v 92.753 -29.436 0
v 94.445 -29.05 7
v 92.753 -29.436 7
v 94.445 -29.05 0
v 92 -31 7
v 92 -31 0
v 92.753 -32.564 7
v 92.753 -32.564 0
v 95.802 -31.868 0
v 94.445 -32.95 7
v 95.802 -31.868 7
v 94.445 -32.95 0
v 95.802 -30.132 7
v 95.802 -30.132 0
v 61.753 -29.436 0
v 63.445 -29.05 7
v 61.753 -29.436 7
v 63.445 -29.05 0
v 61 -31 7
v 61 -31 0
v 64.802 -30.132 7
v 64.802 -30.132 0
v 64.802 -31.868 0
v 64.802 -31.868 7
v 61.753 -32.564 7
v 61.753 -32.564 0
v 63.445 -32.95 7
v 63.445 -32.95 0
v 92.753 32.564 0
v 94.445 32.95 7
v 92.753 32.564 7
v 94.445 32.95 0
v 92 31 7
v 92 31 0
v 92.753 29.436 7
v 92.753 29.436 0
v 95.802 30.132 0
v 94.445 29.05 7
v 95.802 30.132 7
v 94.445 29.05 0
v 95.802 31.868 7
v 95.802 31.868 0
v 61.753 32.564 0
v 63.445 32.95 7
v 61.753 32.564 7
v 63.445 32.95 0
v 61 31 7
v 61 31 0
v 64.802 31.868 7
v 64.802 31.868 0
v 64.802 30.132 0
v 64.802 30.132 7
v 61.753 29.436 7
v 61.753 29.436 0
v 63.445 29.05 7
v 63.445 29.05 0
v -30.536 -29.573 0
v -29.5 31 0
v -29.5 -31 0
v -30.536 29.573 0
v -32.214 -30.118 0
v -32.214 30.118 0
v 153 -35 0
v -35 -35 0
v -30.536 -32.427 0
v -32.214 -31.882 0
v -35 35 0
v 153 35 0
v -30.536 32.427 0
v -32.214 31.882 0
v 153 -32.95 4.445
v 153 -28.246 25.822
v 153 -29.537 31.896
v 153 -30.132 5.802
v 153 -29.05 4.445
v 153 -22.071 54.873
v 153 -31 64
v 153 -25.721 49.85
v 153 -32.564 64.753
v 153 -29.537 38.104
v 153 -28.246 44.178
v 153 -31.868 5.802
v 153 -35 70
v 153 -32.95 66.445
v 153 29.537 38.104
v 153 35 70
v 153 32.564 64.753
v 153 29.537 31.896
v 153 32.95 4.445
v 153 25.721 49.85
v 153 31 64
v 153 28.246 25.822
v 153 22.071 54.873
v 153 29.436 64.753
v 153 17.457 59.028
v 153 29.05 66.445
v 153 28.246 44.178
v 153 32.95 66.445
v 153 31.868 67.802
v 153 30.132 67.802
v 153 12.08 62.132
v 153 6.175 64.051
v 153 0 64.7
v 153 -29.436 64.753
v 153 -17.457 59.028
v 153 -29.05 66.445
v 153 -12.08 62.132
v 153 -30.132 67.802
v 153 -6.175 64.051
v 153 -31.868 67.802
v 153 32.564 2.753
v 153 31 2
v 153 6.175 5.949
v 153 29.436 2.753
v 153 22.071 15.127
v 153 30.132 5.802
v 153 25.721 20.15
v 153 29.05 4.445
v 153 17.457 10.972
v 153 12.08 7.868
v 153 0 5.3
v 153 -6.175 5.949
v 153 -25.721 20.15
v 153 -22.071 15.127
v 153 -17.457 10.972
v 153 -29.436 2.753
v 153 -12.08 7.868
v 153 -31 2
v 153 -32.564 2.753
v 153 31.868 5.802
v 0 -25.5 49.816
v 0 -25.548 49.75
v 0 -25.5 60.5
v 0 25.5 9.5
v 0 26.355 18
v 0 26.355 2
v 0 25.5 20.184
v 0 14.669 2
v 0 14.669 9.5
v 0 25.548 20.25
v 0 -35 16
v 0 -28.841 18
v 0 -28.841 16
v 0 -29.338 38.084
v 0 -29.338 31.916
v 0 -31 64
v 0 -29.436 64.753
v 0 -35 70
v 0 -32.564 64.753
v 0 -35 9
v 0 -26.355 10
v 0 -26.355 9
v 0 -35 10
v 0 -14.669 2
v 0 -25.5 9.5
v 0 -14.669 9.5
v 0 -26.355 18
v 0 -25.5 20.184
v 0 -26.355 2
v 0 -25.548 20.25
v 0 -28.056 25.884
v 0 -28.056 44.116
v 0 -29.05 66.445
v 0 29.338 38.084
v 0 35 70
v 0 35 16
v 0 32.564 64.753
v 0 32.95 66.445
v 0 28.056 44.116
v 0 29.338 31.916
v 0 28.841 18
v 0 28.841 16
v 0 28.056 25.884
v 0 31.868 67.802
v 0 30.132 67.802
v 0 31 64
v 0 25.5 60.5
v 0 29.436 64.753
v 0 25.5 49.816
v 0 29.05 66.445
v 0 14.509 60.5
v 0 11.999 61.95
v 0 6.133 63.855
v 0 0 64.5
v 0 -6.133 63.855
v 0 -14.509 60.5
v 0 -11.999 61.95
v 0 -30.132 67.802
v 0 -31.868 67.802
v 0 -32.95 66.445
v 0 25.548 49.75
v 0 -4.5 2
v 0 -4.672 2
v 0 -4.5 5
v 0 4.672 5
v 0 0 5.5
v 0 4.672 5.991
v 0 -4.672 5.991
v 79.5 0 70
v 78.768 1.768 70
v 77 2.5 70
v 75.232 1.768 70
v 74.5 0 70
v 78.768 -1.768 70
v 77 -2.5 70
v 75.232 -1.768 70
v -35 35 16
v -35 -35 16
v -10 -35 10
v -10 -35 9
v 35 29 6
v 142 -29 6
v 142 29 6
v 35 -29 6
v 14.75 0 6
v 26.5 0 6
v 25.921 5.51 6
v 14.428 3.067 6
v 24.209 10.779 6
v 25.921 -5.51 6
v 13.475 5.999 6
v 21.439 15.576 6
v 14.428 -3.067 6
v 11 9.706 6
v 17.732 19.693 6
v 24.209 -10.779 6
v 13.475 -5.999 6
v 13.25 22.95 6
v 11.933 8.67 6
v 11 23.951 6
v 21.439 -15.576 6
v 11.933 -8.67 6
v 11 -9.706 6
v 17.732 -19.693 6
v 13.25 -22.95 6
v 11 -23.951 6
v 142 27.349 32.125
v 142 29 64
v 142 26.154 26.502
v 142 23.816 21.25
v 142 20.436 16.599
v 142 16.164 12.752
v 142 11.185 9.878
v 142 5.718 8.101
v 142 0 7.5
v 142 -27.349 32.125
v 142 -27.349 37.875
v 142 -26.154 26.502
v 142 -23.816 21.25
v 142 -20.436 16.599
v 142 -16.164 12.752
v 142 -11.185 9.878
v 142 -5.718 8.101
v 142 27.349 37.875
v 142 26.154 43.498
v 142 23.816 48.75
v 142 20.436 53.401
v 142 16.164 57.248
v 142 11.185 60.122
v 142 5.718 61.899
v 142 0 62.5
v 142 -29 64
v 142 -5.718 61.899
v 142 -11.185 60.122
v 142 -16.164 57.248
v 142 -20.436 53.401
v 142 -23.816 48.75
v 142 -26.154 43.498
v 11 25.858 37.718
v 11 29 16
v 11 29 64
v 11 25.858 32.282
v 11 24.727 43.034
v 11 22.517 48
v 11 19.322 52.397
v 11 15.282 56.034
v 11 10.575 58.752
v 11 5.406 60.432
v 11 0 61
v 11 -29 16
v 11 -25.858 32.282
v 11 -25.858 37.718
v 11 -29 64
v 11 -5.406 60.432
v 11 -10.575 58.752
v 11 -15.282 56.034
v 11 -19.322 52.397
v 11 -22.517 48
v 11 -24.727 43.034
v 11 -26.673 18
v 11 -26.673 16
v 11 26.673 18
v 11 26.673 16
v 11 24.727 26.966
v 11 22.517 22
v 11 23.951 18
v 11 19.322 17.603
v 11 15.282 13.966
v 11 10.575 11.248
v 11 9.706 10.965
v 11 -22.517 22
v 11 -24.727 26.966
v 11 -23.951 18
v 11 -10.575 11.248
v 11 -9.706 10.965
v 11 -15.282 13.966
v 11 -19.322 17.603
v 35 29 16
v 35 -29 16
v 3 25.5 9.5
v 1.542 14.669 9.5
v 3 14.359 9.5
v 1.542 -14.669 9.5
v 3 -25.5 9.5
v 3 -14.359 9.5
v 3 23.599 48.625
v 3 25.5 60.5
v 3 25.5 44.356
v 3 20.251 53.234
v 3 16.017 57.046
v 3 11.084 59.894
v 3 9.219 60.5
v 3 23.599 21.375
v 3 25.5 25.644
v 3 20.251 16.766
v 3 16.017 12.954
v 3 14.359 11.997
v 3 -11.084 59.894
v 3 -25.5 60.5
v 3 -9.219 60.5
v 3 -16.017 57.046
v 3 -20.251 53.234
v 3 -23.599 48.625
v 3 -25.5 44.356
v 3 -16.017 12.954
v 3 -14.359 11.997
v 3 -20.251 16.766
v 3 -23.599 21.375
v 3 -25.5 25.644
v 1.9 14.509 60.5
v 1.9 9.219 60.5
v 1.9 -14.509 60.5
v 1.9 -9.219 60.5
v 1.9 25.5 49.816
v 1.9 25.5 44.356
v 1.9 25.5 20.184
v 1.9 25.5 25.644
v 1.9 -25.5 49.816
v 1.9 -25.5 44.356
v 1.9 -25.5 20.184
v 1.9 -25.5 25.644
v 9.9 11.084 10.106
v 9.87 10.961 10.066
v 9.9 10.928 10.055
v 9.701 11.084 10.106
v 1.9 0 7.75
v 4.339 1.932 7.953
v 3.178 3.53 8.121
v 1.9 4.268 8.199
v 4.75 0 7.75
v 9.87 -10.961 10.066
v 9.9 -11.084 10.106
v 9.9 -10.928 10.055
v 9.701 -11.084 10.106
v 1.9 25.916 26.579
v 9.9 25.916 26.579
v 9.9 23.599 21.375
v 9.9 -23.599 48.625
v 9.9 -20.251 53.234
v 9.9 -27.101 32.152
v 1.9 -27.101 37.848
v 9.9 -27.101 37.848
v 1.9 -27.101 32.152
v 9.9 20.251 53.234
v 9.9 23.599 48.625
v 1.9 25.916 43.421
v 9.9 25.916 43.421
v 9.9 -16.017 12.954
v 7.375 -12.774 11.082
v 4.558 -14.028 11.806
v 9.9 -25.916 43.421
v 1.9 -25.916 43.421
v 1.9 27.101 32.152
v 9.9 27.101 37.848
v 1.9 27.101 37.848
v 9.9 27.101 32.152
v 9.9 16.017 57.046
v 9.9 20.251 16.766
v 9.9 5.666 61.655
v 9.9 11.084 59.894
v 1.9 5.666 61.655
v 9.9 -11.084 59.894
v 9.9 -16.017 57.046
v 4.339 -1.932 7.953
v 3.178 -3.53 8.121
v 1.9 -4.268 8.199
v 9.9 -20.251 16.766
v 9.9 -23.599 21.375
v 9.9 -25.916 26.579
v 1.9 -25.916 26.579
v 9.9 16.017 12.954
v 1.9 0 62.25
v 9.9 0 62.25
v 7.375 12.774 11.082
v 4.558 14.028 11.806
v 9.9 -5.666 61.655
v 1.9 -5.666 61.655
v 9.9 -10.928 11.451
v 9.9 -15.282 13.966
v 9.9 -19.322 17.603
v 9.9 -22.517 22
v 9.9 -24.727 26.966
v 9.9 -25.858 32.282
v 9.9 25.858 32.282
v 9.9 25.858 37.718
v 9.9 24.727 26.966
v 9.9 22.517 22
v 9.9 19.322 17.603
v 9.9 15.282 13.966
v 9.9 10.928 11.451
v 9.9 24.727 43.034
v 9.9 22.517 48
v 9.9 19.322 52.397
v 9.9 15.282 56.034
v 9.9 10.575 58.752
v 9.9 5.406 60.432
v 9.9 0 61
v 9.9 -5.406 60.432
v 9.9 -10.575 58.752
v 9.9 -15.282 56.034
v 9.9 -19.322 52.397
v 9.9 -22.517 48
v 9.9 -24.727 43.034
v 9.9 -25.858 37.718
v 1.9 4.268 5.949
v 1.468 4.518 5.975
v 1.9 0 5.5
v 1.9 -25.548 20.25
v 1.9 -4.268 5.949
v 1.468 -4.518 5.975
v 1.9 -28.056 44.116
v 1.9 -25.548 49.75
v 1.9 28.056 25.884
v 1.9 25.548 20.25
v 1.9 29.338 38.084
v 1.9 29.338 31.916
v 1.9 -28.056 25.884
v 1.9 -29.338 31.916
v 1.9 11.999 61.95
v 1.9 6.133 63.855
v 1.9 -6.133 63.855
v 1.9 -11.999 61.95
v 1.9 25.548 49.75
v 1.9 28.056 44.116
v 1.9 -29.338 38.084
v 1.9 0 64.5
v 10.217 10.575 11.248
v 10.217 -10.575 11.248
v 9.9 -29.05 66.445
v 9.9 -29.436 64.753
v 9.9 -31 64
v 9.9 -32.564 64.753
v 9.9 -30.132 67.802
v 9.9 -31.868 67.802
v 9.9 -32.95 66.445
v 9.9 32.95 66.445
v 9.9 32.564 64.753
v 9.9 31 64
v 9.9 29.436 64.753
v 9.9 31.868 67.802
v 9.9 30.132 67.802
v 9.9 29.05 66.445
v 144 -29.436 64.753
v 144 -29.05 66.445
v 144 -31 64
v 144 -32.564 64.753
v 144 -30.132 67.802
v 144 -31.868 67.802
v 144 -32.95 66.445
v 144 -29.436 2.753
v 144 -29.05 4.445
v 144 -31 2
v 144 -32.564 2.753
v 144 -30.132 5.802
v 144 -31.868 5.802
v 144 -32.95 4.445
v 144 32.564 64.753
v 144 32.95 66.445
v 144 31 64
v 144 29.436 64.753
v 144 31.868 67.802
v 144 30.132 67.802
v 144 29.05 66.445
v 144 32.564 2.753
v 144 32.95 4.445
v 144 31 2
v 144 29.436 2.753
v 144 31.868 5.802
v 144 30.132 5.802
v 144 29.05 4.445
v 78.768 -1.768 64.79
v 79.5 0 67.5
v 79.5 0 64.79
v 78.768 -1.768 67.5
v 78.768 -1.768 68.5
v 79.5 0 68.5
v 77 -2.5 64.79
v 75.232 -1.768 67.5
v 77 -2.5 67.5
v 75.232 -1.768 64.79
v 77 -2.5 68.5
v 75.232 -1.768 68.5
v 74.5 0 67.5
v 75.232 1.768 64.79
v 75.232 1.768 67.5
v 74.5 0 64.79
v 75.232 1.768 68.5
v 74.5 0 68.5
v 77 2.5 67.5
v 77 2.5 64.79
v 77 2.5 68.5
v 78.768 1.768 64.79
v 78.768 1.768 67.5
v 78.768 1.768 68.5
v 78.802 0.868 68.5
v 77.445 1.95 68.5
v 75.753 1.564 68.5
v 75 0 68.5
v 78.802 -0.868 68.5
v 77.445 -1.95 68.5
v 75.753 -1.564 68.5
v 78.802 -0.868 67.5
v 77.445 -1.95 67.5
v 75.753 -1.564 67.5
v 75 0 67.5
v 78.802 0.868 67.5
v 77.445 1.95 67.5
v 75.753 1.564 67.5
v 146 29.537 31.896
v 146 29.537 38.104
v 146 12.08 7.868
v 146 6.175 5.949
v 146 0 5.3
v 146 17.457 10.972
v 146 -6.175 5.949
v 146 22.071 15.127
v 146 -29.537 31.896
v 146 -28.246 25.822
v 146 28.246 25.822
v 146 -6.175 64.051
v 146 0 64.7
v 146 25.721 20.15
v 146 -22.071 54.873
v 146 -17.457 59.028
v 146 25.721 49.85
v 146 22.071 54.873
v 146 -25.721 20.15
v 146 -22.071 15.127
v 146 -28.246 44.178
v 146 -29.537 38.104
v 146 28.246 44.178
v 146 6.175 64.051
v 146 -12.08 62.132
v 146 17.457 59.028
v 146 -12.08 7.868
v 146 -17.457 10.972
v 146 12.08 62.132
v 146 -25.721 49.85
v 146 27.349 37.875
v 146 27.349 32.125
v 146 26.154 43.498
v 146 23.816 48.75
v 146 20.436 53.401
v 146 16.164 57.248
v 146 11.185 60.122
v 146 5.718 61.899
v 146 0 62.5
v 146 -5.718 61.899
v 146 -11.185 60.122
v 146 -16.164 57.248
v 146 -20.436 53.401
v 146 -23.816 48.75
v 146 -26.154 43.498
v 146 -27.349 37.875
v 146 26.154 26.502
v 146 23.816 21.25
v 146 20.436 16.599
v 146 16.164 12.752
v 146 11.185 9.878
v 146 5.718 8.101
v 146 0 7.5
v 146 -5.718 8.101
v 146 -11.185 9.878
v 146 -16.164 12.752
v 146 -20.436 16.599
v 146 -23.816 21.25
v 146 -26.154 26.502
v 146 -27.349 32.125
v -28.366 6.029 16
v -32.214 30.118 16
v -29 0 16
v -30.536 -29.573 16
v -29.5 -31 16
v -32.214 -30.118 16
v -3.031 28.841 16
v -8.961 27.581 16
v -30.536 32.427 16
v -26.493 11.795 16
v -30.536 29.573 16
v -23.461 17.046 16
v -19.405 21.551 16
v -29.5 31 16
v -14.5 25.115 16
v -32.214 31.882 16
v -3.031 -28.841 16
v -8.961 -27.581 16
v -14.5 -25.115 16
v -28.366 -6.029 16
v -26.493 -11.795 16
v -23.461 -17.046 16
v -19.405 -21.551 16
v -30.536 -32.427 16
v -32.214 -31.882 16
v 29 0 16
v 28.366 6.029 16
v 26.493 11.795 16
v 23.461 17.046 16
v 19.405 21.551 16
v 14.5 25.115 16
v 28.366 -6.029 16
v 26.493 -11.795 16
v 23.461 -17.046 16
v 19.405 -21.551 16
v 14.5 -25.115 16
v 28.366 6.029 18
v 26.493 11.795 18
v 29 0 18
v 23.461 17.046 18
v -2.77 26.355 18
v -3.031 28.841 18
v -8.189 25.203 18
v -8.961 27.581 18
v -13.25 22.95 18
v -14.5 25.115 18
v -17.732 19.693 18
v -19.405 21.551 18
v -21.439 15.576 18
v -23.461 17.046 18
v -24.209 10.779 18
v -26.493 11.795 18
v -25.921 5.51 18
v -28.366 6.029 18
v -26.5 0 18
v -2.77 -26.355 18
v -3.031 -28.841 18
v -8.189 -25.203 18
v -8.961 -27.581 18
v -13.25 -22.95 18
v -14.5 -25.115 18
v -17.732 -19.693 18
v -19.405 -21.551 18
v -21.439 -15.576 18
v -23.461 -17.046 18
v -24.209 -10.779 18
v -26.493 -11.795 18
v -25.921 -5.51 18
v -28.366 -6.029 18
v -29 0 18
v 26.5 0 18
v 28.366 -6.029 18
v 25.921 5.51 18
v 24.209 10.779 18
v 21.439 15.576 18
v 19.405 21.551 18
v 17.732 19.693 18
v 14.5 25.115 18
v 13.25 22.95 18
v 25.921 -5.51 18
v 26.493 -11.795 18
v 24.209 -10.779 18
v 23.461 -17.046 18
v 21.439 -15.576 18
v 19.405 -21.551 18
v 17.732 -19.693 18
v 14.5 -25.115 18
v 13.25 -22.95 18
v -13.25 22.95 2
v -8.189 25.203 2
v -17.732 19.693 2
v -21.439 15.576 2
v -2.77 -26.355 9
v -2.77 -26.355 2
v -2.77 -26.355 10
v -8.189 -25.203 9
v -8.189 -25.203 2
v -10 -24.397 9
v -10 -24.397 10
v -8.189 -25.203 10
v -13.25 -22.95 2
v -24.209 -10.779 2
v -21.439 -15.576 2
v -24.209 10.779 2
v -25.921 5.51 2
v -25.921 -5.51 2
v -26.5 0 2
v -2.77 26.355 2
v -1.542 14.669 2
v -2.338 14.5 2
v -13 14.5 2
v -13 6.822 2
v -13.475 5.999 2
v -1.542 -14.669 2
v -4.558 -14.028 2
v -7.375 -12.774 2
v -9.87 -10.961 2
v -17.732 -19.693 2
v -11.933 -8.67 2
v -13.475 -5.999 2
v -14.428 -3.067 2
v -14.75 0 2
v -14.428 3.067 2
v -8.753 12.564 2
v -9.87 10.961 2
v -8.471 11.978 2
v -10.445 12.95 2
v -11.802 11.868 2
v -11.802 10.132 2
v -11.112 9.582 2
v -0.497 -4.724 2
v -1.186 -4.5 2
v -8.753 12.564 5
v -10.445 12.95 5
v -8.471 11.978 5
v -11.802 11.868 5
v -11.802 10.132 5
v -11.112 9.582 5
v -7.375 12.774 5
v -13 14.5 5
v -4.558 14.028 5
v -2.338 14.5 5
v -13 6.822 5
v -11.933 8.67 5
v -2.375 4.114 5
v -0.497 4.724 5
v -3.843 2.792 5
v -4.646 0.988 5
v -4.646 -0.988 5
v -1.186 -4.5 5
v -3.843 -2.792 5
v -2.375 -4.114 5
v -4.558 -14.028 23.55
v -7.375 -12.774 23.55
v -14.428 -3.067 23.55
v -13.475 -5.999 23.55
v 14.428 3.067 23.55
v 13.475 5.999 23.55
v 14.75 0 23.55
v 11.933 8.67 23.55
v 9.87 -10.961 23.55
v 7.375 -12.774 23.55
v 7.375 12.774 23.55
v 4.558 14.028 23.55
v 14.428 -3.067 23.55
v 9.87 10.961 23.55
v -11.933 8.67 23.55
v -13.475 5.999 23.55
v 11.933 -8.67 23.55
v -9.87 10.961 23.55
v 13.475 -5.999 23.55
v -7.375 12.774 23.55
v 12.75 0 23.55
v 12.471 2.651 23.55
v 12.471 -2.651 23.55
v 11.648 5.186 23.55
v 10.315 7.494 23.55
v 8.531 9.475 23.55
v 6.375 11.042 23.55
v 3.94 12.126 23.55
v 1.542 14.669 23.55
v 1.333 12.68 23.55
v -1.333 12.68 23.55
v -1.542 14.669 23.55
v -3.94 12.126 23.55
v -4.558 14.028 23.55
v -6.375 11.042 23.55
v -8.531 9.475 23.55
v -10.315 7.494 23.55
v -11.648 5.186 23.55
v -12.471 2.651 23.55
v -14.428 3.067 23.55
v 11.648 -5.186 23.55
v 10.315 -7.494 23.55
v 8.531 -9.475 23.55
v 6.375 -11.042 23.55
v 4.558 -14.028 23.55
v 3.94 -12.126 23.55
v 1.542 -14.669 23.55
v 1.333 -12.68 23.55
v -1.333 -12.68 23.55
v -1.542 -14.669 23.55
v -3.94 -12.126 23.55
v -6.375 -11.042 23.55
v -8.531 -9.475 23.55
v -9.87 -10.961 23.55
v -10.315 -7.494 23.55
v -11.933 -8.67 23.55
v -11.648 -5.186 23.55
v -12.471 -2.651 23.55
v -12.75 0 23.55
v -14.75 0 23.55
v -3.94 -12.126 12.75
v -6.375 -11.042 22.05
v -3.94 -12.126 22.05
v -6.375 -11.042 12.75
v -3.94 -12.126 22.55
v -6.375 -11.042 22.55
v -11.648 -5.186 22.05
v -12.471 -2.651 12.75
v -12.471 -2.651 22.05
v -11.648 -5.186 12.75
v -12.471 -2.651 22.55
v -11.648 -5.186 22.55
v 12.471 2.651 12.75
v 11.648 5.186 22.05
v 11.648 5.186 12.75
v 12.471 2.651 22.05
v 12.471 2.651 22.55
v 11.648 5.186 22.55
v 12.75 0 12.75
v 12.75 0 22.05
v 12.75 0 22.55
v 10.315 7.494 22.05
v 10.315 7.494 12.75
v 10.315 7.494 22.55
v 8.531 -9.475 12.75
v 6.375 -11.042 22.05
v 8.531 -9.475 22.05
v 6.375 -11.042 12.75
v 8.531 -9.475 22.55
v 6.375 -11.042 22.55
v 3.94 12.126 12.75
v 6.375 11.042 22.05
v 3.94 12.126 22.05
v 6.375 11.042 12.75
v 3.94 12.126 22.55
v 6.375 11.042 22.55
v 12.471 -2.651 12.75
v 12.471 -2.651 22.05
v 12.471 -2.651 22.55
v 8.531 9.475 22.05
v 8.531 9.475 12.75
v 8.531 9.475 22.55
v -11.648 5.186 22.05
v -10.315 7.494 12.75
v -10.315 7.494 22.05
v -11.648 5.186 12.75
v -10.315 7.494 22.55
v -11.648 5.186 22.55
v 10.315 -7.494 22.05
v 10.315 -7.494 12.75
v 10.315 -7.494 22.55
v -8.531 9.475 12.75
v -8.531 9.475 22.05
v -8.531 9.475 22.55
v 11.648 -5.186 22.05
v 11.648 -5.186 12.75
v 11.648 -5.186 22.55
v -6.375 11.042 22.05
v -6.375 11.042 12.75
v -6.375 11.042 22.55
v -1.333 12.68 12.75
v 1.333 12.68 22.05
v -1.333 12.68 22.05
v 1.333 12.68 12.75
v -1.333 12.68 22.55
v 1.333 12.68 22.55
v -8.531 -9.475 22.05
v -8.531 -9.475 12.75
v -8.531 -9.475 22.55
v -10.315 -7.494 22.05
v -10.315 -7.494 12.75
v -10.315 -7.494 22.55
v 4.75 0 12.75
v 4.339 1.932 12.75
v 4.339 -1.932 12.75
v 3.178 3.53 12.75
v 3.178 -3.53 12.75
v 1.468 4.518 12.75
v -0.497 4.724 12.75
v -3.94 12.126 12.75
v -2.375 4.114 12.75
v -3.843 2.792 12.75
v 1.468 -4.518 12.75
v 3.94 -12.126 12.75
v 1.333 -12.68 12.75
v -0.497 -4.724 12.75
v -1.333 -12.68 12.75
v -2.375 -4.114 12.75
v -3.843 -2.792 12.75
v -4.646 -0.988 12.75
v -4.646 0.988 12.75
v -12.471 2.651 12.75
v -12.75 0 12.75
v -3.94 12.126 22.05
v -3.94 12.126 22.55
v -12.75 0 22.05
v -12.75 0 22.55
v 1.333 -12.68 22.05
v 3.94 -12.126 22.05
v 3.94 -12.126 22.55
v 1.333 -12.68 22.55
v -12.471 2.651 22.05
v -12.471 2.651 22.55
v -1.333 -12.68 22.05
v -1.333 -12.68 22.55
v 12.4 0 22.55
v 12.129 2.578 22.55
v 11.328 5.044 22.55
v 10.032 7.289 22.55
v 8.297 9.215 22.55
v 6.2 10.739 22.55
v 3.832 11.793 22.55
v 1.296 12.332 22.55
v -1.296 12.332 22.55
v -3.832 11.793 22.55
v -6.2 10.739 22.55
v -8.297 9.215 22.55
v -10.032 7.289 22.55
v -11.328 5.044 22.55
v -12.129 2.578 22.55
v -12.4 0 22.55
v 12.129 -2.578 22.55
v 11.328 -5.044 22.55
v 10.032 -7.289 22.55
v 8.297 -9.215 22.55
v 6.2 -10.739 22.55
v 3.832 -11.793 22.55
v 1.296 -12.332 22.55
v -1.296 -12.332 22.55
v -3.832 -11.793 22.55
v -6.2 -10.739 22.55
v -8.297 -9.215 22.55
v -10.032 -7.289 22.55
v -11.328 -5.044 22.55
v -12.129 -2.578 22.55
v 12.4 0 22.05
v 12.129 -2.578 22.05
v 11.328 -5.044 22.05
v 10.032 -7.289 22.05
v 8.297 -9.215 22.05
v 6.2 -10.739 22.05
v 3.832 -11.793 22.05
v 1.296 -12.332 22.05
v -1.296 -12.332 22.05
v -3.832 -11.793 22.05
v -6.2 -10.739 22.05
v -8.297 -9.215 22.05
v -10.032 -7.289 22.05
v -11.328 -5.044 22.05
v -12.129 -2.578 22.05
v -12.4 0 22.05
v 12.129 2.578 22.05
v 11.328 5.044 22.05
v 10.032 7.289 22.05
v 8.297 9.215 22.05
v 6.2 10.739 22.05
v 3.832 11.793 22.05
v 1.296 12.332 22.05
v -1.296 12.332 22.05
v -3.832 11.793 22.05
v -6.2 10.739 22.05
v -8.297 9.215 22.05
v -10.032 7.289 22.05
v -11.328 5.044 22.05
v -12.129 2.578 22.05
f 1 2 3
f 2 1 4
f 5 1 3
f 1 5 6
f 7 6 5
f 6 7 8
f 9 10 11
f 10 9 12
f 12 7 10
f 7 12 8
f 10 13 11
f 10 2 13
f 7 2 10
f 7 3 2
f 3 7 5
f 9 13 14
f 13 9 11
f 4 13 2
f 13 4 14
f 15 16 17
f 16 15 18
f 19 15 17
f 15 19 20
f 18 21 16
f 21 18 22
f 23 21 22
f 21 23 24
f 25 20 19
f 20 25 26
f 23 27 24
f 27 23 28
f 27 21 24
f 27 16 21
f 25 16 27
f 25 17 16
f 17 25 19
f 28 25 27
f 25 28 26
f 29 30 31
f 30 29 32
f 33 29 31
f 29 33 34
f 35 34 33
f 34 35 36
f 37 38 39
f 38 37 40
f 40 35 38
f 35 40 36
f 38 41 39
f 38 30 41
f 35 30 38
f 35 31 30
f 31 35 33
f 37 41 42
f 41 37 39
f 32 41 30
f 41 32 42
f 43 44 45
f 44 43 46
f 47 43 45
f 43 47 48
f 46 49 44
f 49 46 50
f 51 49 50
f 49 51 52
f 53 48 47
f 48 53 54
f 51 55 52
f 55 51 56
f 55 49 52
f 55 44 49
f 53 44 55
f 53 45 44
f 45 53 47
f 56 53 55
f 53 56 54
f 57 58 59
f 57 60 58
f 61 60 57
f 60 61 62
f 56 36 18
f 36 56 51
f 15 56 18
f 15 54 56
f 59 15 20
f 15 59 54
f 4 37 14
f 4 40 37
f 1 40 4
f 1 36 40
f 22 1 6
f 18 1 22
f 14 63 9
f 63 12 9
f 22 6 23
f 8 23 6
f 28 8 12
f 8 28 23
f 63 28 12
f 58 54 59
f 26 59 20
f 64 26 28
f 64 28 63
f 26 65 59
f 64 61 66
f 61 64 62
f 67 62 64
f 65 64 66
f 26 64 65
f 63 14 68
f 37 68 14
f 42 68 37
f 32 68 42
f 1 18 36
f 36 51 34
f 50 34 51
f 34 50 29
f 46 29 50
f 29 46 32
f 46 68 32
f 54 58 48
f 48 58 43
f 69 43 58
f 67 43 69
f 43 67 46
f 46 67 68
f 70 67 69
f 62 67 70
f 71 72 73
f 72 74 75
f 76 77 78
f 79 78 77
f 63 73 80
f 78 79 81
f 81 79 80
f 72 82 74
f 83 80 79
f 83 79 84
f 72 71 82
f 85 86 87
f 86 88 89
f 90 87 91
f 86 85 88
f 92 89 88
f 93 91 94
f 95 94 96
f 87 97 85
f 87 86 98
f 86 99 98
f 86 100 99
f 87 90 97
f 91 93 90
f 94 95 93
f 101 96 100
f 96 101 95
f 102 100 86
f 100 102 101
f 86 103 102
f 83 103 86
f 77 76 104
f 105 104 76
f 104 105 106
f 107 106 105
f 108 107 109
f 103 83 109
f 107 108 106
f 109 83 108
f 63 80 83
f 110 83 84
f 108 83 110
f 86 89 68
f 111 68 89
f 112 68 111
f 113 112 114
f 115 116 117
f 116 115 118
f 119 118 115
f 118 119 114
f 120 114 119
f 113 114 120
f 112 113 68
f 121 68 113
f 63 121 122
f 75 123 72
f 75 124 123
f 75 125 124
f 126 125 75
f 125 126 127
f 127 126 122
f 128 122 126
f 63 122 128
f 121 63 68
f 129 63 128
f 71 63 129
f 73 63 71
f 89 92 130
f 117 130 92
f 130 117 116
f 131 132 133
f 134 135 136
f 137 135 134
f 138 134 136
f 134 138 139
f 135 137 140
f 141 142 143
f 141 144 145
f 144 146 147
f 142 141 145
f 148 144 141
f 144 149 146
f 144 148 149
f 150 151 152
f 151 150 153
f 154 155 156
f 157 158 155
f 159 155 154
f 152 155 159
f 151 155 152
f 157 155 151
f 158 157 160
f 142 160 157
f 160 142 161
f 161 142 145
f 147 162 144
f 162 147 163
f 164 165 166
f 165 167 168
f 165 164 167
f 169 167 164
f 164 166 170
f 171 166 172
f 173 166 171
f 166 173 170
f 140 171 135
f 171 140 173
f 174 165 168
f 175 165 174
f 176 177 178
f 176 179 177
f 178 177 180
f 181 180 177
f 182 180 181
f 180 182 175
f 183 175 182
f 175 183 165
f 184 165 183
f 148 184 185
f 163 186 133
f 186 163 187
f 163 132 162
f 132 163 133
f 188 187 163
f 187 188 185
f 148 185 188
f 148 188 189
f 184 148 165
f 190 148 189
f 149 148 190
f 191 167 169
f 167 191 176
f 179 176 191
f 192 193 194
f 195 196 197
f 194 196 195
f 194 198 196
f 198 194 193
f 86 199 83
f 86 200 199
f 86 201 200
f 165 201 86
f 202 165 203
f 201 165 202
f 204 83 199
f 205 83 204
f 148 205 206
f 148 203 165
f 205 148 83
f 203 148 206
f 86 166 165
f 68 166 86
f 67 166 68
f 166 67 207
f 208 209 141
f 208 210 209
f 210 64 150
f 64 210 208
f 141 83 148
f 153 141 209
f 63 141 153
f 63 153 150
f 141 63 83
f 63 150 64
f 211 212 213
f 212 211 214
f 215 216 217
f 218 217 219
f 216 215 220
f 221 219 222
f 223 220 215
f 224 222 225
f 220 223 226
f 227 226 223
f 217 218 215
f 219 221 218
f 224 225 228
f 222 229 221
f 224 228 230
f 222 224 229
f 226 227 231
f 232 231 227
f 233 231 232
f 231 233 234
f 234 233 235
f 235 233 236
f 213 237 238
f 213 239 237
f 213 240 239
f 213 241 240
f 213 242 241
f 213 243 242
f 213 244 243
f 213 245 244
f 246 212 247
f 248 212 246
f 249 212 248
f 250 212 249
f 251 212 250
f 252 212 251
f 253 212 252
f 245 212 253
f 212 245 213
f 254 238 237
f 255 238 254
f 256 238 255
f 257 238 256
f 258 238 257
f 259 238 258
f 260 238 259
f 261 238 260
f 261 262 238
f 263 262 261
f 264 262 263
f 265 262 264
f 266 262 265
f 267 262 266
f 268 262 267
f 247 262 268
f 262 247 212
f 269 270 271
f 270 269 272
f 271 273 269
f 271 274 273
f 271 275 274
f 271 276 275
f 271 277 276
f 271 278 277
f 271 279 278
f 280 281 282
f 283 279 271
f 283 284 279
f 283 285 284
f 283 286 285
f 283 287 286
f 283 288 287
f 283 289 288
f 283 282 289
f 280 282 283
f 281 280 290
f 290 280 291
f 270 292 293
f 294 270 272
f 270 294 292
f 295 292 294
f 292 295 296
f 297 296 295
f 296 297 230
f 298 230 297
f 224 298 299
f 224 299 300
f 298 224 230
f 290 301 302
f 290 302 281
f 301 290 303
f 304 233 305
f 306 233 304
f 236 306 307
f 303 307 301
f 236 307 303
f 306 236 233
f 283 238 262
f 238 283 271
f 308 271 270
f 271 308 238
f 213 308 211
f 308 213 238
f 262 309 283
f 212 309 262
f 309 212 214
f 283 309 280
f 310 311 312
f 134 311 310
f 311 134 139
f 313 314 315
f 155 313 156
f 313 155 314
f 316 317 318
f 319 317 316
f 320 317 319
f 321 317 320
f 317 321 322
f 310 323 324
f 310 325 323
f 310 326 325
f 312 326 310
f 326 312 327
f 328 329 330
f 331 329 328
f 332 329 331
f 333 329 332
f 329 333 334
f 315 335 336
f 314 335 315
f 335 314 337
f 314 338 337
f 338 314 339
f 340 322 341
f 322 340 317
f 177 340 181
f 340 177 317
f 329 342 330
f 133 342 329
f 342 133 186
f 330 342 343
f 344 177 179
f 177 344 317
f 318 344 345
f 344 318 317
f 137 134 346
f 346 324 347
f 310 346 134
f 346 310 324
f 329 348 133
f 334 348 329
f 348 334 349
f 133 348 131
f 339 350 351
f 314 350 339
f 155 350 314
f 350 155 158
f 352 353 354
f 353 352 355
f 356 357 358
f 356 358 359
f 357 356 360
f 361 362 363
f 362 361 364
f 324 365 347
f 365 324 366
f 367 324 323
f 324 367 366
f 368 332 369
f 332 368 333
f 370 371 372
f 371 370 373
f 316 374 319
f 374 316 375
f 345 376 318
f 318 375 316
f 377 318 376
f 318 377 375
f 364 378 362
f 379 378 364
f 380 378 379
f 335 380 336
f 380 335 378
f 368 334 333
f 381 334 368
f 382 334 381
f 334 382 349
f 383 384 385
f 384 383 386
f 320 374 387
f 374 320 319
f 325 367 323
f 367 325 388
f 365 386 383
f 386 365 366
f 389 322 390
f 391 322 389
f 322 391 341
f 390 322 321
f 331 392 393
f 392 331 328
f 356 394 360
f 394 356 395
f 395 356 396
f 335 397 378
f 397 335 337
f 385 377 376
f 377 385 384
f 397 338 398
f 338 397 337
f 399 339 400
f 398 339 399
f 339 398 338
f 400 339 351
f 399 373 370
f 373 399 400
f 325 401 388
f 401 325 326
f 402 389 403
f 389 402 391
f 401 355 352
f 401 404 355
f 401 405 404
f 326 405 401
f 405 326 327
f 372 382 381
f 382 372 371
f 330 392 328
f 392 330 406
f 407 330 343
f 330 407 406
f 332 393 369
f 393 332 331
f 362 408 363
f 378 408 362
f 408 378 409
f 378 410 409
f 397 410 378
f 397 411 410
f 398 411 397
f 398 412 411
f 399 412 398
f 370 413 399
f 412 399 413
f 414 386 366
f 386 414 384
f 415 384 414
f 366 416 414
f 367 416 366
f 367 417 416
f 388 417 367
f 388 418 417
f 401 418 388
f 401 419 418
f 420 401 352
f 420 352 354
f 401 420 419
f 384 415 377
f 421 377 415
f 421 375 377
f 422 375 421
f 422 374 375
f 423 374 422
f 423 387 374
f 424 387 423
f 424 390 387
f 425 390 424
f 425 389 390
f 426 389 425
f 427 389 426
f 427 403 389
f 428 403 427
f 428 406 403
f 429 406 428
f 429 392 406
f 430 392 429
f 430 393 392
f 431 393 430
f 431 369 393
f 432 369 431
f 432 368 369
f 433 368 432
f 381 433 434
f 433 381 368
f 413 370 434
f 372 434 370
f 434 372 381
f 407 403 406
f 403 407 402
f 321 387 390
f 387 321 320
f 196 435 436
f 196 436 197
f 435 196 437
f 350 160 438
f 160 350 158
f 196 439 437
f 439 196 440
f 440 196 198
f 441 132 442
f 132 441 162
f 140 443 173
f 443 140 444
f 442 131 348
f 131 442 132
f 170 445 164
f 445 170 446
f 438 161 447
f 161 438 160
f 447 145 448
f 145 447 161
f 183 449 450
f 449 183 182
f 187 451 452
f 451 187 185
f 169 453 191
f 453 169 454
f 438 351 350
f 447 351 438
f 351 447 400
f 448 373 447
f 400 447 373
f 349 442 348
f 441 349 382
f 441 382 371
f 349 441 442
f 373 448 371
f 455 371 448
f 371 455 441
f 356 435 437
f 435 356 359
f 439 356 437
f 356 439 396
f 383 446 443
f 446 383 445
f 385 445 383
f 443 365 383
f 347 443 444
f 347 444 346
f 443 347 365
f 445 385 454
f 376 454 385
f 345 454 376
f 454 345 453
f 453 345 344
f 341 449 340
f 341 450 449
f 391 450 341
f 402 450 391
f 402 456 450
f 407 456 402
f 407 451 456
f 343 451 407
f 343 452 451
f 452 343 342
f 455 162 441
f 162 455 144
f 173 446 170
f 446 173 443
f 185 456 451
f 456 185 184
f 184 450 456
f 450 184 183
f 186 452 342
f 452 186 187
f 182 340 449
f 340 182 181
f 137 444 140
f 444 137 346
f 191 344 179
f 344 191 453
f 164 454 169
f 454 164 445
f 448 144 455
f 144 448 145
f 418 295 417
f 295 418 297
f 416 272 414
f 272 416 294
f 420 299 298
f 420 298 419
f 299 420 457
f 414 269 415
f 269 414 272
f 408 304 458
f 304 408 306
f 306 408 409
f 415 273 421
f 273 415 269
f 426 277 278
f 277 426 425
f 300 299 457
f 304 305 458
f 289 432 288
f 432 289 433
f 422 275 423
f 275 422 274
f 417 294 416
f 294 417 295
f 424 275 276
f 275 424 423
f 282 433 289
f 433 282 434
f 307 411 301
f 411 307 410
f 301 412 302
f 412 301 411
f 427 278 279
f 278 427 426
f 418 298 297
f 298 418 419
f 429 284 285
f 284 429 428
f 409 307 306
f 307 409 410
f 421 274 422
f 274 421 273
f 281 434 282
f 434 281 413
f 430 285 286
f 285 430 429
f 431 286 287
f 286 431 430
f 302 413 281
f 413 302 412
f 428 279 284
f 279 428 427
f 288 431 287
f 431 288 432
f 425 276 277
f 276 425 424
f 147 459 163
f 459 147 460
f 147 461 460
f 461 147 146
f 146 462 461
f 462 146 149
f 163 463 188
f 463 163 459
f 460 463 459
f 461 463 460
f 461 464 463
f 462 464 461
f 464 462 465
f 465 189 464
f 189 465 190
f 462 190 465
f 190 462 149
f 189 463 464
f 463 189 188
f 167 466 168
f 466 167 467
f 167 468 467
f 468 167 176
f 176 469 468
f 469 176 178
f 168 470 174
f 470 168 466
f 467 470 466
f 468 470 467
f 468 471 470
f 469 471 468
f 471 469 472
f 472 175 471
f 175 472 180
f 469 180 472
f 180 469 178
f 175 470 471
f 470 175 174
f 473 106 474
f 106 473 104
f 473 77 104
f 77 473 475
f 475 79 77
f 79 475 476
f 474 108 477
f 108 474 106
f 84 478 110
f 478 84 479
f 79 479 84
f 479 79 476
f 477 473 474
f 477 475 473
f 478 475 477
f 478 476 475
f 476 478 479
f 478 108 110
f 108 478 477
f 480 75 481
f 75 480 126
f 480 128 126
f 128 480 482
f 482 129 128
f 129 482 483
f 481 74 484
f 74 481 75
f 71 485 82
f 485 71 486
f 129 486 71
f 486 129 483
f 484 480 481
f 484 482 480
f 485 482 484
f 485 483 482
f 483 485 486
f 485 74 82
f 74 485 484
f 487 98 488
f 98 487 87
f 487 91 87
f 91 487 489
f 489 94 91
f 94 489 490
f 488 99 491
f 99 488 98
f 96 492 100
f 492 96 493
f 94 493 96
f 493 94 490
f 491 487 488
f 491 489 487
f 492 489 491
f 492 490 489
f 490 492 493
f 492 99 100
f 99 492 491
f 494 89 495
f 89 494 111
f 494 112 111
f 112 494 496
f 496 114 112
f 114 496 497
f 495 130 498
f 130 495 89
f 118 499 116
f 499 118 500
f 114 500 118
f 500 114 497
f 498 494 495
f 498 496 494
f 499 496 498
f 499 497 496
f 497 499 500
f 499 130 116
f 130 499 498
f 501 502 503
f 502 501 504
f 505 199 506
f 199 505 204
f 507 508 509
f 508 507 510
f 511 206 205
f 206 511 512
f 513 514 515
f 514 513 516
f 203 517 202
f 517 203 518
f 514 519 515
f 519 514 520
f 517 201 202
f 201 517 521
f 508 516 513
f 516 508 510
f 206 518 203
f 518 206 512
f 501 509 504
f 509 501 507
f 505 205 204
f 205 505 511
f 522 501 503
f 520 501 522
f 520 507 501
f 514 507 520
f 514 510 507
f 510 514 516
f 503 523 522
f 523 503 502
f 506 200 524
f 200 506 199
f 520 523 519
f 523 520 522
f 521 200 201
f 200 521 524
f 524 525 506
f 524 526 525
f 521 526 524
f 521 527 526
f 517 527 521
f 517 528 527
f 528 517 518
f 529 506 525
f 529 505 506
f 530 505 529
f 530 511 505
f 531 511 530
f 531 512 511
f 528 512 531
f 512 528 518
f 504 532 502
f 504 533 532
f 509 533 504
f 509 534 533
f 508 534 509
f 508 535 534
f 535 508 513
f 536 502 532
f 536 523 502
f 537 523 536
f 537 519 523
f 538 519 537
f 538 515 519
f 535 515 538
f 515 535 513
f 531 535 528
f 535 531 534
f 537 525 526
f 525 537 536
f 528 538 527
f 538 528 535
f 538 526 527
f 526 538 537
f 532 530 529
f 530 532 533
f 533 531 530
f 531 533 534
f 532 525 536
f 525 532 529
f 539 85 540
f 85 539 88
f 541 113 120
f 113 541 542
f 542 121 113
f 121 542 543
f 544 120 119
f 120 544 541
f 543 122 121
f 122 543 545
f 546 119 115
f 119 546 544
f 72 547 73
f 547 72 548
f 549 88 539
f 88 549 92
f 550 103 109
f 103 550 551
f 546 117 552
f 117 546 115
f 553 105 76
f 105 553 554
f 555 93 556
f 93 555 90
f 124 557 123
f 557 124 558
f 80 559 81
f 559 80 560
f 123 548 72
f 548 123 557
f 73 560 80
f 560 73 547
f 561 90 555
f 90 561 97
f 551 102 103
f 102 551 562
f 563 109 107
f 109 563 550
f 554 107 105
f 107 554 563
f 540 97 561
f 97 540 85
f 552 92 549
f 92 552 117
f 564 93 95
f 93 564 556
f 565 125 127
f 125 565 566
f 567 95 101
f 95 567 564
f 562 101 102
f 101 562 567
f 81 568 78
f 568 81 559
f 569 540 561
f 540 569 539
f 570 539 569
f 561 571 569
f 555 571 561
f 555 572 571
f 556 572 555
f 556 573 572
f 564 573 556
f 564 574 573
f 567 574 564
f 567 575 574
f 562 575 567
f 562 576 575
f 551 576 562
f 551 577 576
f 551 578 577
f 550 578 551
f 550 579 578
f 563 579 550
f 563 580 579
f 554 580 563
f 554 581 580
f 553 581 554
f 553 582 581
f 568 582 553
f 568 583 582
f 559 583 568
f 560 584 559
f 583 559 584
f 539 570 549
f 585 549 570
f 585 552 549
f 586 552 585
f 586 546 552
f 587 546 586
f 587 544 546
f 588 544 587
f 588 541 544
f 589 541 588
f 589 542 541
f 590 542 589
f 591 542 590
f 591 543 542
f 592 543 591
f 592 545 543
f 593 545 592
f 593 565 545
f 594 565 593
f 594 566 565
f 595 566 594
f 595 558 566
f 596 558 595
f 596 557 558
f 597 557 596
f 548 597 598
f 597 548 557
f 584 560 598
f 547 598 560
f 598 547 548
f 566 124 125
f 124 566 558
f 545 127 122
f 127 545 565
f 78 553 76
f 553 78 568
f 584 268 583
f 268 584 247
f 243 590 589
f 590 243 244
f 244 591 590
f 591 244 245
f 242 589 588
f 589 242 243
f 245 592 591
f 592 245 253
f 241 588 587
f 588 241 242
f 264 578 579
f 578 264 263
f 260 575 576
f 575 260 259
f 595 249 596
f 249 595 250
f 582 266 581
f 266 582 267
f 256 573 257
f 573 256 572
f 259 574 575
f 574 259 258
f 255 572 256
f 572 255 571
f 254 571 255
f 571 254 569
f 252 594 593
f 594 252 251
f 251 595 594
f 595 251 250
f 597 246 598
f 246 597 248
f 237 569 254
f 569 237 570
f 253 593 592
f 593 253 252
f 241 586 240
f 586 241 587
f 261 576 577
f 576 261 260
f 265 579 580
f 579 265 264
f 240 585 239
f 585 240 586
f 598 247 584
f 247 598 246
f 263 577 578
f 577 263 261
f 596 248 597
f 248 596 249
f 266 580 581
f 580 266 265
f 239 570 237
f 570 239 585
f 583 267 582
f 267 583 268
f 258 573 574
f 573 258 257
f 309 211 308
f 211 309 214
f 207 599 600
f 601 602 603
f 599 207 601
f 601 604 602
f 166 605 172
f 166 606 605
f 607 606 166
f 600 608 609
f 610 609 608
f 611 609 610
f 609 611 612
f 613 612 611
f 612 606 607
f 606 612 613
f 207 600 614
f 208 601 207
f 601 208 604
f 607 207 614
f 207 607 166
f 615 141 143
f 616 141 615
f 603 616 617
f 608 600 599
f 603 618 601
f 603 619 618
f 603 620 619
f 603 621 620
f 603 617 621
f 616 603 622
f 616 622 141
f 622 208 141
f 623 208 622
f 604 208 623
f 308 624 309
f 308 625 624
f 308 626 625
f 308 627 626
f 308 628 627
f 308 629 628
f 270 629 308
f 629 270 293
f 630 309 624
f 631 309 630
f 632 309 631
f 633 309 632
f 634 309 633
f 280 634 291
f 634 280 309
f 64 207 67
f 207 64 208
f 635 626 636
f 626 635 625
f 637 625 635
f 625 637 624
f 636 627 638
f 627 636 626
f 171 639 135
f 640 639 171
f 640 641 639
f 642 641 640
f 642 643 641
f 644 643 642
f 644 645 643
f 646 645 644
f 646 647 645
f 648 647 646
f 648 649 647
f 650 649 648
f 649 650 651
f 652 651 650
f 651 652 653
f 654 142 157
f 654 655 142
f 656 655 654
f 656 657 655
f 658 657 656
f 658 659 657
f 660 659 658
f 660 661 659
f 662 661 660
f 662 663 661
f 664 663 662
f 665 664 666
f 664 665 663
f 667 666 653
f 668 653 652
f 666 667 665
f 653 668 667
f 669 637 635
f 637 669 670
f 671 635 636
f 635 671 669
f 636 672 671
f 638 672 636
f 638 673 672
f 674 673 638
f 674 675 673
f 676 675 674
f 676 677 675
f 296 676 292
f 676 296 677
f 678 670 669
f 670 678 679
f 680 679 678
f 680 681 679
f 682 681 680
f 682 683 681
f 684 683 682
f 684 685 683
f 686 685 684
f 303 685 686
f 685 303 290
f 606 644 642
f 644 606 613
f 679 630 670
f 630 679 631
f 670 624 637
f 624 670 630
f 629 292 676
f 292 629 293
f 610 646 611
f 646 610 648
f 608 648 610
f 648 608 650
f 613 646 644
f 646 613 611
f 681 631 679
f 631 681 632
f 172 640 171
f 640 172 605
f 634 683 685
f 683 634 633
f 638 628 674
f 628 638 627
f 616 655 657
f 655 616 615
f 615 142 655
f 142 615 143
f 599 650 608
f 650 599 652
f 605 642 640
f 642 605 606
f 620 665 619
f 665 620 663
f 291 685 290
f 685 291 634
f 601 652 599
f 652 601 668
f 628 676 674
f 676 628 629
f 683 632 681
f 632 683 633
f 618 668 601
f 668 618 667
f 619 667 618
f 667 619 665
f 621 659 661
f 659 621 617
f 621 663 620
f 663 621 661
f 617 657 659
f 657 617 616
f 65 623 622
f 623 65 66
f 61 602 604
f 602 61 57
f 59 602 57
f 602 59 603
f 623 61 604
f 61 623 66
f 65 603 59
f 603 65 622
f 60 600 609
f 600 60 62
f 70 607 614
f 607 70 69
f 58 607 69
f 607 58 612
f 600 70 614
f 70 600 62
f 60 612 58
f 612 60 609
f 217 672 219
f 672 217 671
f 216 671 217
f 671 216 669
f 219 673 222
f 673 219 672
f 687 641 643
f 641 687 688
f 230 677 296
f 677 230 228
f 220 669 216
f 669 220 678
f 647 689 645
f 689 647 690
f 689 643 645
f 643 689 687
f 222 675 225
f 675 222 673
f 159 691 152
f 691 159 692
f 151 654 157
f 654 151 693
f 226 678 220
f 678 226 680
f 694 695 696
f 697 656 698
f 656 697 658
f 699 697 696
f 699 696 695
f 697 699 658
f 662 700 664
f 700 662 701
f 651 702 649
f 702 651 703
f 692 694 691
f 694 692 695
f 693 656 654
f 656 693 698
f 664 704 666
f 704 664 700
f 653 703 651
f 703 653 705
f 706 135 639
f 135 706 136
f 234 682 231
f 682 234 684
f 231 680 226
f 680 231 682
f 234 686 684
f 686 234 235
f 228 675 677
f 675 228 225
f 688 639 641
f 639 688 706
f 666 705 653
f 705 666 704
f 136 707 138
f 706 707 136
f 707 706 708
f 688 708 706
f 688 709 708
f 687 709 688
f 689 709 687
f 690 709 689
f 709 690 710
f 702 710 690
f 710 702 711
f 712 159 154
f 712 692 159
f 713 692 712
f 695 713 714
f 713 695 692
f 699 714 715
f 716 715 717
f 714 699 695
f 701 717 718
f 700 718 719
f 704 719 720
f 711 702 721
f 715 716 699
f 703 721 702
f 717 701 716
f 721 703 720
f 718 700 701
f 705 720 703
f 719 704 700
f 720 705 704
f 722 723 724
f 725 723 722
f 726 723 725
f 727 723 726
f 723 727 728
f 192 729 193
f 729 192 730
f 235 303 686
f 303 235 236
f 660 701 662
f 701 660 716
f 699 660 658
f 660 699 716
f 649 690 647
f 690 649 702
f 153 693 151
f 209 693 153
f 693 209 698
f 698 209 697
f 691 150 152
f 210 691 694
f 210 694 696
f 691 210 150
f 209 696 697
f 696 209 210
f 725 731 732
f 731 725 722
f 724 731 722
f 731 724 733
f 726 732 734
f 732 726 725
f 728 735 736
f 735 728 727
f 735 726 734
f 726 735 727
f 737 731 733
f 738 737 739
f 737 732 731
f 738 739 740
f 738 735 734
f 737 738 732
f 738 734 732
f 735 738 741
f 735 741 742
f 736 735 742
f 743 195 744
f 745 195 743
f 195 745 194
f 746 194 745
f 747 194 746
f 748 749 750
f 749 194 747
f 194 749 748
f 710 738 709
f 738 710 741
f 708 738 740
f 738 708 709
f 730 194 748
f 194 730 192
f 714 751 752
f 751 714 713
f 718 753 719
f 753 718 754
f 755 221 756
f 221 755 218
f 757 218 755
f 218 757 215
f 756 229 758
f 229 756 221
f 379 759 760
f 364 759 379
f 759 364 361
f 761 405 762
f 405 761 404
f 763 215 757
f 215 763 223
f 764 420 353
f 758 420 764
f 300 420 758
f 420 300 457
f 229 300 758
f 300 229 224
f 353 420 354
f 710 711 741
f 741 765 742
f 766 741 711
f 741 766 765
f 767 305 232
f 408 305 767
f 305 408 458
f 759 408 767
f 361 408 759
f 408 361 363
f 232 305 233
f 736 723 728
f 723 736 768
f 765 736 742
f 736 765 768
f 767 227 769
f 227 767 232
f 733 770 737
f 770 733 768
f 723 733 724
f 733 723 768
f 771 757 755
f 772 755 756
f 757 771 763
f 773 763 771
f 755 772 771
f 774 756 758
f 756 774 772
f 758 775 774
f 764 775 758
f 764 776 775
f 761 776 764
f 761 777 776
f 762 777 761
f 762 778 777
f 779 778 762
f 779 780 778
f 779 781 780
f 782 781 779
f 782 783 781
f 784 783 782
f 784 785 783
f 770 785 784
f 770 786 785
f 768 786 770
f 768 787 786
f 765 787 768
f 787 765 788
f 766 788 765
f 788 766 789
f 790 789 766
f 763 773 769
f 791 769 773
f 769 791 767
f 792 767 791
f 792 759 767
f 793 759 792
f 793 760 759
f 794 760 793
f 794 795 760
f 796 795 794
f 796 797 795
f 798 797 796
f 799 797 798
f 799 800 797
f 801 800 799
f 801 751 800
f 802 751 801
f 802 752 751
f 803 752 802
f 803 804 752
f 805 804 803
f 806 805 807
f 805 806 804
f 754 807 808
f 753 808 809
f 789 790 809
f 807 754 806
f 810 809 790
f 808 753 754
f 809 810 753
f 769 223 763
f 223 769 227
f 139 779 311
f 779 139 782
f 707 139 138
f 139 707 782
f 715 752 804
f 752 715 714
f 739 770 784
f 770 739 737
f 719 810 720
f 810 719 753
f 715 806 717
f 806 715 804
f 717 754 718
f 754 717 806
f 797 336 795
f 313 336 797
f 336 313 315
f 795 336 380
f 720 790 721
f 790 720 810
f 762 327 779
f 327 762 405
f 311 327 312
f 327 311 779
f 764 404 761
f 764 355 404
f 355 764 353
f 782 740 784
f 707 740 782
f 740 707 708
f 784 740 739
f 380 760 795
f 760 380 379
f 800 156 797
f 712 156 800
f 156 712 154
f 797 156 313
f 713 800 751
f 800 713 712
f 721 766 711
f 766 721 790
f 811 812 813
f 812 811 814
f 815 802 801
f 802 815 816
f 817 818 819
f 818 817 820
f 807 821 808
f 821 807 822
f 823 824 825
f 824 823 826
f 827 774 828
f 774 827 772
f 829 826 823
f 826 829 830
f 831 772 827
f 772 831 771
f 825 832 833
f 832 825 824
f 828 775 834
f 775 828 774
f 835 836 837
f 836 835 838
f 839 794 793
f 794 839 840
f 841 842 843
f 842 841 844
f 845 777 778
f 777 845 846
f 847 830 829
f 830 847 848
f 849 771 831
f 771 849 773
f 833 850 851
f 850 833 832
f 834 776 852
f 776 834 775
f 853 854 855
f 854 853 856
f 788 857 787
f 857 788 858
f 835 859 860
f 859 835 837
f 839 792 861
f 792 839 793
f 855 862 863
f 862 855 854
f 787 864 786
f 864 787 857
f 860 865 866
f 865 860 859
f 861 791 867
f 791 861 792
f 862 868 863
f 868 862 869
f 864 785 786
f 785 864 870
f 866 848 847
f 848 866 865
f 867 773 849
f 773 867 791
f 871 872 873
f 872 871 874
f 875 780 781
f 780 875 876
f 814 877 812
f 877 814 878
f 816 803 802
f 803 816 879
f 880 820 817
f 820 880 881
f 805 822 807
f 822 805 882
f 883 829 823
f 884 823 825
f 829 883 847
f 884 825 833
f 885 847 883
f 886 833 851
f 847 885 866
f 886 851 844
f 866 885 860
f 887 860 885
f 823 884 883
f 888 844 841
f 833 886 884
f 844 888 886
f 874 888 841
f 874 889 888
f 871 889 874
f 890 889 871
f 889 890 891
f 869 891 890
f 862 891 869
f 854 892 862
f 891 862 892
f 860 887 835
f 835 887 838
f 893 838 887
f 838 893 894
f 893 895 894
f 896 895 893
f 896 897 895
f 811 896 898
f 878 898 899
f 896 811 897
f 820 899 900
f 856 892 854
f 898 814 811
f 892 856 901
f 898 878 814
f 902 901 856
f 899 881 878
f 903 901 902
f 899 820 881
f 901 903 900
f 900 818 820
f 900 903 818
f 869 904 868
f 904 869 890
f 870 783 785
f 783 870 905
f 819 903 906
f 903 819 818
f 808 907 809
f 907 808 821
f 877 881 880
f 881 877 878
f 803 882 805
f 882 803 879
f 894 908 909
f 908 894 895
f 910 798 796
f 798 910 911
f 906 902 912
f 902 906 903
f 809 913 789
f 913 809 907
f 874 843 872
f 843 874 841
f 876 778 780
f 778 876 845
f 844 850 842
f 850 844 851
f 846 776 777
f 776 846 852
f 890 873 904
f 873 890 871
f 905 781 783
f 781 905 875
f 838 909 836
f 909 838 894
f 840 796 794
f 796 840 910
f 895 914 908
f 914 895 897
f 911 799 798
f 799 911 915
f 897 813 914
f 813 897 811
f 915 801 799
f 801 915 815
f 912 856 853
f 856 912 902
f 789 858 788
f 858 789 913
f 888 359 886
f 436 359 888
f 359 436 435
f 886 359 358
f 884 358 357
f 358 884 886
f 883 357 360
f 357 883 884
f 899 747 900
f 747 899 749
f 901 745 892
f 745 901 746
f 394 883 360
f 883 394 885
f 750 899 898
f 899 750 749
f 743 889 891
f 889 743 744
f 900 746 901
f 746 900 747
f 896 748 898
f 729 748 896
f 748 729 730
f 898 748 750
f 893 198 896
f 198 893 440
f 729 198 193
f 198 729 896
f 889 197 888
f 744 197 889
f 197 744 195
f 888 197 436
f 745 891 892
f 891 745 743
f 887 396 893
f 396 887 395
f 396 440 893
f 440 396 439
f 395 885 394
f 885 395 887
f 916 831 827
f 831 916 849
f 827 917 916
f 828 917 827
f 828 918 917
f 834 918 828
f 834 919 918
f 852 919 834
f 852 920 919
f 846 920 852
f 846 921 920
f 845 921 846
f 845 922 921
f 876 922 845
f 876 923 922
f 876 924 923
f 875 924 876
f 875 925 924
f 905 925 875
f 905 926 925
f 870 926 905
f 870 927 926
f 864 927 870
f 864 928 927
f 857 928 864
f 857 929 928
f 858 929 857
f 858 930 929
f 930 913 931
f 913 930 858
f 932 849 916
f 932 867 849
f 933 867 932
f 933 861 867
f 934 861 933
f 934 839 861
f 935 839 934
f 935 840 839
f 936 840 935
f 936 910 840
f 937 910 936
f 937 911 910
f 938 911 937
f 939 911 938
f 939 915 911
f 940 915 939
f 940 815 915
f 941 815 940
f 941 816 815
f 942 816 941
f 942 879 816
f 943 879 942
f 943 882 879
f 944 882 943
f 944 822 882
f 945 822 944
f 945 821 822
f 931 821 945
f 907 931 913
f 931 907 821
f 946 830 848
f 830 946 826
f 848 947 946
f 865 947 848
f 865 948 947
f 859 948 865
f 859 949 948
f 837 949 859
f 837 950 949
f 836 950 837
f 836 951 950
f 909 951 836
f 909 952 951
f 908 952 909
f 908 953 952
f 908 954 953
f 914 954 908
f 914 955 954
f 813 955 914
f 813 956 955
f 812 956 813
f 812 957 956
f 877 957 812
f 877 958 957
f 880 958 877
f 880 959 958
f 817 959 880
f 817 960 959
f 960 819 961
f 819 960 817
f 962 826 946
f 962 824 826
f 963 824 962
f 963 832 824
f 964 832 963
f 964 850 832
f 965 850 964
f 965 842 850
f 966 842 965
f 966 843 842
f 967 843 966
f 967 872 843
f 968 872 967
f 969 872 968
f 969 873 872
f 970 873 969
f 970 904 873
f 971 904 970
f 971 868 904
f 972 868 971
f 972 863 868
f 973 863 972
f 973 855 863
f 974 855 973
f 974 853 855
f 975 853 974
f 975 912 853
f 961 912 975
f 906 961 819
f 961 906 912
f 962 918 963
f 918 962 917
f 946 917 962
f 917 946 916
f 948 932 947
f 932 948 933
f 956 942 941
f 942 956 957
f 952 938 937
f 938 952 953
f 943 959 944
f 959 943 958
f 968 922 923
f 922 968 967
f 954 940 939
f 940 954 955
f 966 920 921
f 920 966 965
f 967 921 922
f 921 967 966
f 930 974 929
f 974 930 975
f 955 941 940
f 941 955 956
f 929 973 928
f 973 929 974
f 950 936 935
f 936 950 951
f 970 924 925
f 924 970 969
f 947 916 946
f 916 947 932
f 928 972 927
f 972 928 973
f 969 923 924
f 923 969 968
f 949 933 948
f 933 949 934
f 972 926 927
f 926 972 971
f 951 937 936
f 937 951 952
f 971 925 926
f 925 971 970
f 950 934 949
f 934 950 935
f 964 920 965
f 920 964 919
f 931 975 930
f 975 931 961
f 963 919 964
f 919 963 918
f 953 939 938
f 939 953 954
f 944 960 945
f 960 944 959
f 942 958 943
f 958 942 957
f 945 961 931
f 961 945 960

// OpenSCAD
// file: Camara.scad
include <Tubo.scad>



//translate([0,0,30])
//bigTubo();

Camara();




module Camara(){

//Alsa para cámara
//translate([-12.5,-10,5])
//cube([25,24,2]);

difference(){

//Crear bloque
creaBloqueCam();

//Tornillos abajo
translate([-ori+4,-ori+4,-0.1])
cylinder(r=1.5,30);
translate([ori-4,-ori+4,-0.1])
cylinder(r=1.5,30);
translate([-ori+4,ori-4,-0.1])
cylinder(r=1.5,30);
translate([ori-4,ori-4,-0.1])
cylinder(r=1.5,30);

//Tubo para camara
translate([0,0,2])
cylinder(r=(raspSellR/2)-3,18);

//Ranura cable
translate([-10,-ori-5,9])
cube([20,20,1]);

}


difference(){

translate([-13,-4.5,1])
cube([26,19,4]);

tornCam();
}





}


module tornCam(){
//Tornillos camara
translate([-10,11,-0.1])
cylinder(r=2,30);
translate([10,11,-0.1])
cylinder(r=2,30);
translate([-10,-1,-0.1])
cylinder(r=2,30);
translate([10,-1,-0.1])
cylinder(r=2,30);
}


module creaBloqueCam(){
//Bloque
translate([-bigW/2,-bigW/2,0])
cube([bigW,bigW,16]);

//Sello
cylinder(r=(raspSellR/2)-0.5,18);


}
// file: Tubo.scad
bigW = 70;
ori = bigW/2;
raspSellR = 59;
tuboH = 140;
H = tuboH+2+8+1+2;
selloH = 7;

huecoPared = 12;
huecoH = 22;

translate([0,0,bigW/2])
rotate([0,90,0])
bigTuboHueco();

module bigTuboHueco()
{
	difference()
	{
		bigTubo();	
		sello();
	}
}


module sello()
{
	translate([0,0,H-selloH])
	cylinder(r=(raspSellR/2)+0.2,selloH+0.1);
	
	translate([0,0,H-selloH-30])
	cylinder(r=(raspSellR/2)-2,selloH+40);
}


module bigTubo(){

difference(){

//Bloque
translate([-bigW/2,-bigW/2,0])
cube([bigW,bigW,H]);


translate([
						-(bigW-huecoPared)/2,
						-(bigW-huecoPared)/2,
						(huecoH/2)
					])
		cube([
					bigW-huecoPared,
					bigW-huecoPared,
					H-huecoH]
				);


//Diffractador
translate([-25.5,-25.5,-0.1])
cube([51,51,3.1]);

//Macro
translate([0,0,-0.1])
cylinder(r=(54.5/2),10);

//Sello de raspberry
translate([0,0,-0.1])
cylinder(r=(raspSellR/2),2);

//Tubo
translate([0,0,-0.1])
cylinder(r=(52/2),200);

//Tornillos abajo
translate([-ori+4,-ori+4,-0.1])
cylinder(r=2,10);
translate([ori-4,-ori+4,-0.1])
cylinder(r=2,10);
translate([-ori+4,ori-4,-0.1])
cylinder(r=2,10);
translate([ori-4,ori-4,-0.1])
cylinder(r=2,10);

//Hueco
//translate([0,0,2+8+1+2])
//cylinder(r=(raspSellR/2),tuboH+0.1);

//Tornillos arriba
translate([-ori+4,-ori+4,H-9])
cylinder(r=2,10);
translate([ori-4,-ori+4,H-9])
cylinder(r=2,10);
translate([-ori+4,ori-4,H-9])
cylinder(r=2,10);
translate([ori-4,ori-4,H-9])
cylinder(r=2,10);

//Tornillos caja
translate([0,0,(tuboH/2)-7])
rotate([0,90,0])
tornillosArriba();

//Tornillo tripie
translate([-ori-0.1,0,(tuboH/2)+7])
rotate([0,90,0])
cylinder(r=5/2,5.31);


}


//Rosca tornillo tripie
difference(){
translate([-ori+1.5,0,(tuboH/2)+7])
rotate([0,90,0])
cylinder(r=5,1);

translate([-ori+1.4,0,(tuboH/2)+7])
rotate([0,90,0])
cylinder(r=5-3,3);


}

}

module tornillosArriba(){
translate([-ori+4,-ori+4,ori-7])
cylinder(r=2,10);
translate([0,-ori+4,ori-7])
cylinder(r=2,10);
translate([-ori+4,ori-4,ori-7])
cylinder(r=2,10);
translate([0,ori-4,ori-7])
cylinder(r=2,10);
}


module tornilloTripie(){
	
}
// main file
include <Tubo.scad>
include <Camara.scad>


pared = 4;
tapaW = 25.5;
tapaFibH = 12.75+2+8.8;
fibW=9.5;

difference(){
//Pared
cylinder(
			r=((tapaW+pared)/2),
			tapaFibH
		 );
//Hueco
translate([0,0,12.75])
cylinder(r=tapaW/2,tapaFibH);
//Fibra óptica space
translate([0,0,-0.1])
cylinder(r=fibW/2,tapaFibH);

}

translate([0,0,tapaFibH-1.5])
createRosca(tapaW,0.5,0.7);

module createRosca(w,h,l){
	difference(){
	cylinder(r=((w+1)/2),h);
	translate([0,0,-0.1])
	cylinder(r=(w-l)/2,h+0.2);
	}
}
